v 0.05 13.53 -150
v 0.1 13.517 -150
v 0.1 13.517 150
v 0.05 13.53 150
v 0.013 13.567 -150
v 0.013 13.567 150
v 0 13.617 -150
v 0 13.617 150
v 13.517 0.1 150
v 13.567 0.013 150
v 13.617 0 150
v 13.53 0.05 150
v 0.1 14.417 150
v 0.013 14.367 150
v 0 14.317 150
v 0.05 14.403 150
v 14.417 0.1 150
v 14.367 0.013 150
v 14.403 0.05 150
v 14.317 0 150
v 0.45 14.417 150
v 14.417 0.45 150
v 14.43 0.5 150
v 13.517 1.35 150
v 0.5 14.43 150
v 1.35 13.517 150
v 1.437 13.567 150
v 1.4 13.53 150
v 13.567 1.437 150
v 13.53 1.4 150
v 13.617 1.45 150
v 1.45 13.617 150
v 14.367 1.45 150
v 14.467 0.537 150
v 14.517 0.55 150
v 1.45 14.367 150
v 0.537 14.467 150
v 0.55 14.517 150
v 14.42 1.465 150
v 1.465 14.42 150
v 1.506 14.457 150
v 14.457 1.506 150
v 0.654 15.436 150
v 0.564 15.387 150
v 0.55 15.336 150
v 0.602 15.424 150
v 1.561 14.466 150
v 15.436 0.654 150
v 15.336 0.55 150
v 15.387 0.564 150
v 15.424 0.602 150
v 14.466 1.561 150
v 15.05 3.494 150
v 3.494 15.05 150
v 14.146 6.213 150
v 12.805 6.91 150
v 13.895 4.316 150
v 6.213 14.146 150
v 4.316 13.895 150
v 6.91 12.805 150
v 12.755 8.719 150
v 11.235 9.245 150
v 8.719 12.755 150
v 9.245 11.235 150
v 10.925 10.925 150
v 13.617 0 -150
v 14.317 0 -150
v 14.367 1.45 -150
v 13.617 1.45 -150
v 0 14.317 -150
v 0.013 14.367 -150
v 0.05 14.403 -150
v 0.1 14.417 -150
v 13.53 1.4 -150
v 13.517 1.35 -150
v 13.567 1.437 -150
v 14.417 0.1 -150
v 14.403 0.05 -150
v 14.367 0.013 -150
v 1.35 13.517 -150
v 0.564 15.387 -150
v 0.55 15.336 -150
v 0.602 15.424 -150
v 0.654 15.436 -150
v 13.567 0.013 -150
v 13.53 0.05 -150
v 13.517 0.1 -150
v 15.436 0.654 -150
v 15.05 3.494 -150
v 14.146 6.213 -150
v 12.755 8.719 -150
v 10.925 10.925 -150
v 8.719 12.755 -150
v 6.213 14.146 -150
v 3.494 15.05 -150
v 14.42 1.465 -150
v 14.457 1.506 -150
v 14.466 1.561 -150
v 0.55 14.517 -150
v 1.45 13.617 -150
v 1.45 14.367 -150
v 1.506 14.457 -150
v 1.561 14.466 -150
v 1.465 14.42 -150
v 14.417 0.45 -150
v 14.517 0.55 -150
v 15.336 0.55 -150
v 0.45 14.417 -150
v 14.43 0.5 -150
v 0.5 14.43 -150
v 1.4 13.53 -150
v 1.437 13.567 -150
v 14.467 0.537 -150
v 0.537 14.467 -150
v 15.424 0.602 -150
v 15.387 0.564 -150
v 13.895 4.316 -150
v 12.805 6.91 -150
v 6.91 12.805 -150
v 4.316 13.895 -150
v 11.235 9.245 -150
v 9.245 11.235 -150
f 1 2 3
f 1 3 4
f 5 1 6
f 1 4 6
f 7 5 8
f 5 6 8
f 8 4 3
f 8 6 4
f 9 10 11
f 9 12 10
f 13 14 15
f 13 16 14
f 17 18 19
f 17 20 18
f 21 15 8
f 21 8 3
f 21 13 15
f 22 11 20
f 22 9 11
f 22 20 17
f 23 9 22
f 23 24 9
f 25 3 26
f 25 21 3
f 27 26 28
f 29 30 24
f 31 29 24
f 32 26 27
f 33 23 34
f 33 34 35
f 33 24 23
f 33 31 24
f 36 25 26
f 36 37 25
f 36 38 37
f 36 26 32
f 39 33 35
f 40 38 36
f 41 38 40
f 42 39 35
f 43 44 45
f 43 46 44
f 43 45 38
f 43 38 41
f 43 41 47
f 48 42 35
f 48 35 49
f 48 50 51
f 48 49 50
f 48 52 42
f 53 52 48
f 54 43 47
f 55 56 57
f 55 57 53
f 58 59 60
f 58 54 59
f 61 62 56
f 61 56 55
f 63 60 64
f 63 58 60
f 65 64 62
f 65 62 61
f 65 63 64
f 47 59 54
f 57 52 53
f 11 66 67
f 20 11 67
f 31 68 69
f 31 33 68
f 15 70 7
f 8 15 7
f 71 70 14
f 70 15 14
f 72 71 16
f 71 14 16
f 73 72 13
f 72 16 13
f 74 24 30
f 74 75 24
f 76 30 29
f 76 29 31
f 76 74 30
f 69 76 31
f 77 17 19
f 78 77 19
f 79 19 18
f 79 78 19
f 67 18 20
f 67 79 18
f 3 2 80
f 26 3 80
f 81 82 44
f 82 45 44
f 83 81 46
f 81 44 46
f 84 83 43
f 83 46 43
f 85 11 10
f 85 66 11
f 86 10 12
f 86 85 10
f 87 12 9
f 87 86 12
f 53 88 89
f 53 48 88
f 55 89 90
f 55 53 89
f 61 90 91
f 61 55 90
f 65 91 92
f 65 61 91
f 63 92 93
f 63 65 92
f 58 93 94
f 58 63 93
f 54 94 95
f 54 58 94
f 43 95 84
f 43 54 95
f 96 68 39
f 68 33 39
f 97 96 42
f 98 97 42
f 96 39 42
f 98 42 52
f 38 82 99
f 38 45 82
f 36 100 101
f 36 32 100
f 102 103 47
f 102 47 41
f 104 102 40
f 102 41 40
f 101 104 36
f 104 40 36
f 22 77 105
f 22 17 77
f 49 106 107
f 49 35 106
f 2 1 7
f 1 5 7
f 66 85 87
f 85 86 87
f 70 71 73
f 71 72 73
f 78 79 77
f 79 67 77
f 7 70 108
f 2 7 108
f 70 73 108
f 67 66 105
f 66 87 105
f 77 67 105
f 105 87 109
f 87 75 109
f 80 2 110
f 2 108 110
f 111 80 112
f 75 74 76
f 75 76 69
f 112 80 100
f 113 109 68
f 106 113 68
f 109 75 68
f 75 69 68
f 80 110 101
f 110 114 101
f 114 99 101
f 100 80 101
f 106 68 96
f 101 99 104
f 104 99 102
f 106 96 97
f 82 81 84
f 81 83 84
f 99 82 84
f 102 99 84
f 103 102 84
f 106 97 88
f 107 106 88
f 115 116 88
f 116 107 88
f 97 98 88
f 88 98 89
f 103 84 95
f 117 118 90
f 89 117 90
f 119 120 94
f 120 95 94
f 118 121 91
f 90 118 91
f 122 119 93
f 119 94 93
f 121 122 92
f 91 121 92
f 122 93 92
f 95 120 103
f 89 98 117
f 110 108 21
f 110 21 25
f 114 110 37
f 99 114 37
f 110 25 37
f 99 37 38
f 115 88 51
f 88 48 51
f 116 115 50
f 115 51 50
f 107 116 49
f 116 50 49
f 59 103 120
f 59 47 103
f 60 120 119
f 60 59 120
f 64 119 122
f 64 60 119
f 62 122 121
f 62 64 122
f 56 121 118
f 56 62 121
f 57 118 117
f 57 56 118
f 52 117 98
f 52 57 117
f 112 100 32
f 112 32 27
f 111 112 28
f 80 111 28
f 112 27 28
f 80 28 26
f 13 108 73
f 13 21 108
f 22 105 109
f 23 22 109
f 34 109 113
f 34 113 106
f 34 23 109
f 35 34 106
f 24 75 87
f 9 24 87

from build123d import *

# Parameters (mm, degrees)
EXTRUDE_THIN1_DEPTH = 150
FILLET1_R           = 0.1


with BuildPart() as part:
    # Sketch1 → Extrude-Thin1 (new, symmetric)
    with BuildSketch(Plane.XY):
        with BuildLine():
            Line((14.416629547, 0), (14.416629547, 0.55))
            Line((14.416629547, 0.55), (15.440207252, 0.55))
            ThreePointArc((15.440207252, 0.55), (10.924799769, 10.924799769), (0.55, 15.440207252))
            Line((0.55, 15.440207252), (0.55, 14.416629547))
            Line((0.55, 14.416629547), (0, 14.416629547))
            Line((0, 14.416629547), (0, 13.516629547))
            Line((0, 13.516629547), (1.45, 13.516629547))
            Line((1.45, 13.516629547), (1.45, 14.477568857))
            ThreePointArc((1.45, 14.477568857), (10.288403666, 10.288403666), (14.477568857, 1.45))
            Line((14.477568857, 1.45), (13.516629547, 1.45))
            Line((13.516629547, 1.45), (13.516629547, 0))
            Line((13.516629547, 0), (14.416629547, 0))
        make_face()
    extrude(amount=EXTRUDE_THIN1_DEPTH, both=True)

    # Fillet1
    fillet1_edges = [part.edges().sort_by_distance(p)[0] for p in [
        (13.516629547, 1.45, 0),
        (14.477568857, 1.45, 0),
        (1.45, 14.477568857, 0),
        (1.45, 13.516629547, 0),
        (0, 13.516629547, 0),
        (0, 14.416629547, 0),
        (0.55, 14.416629547, 0),
        (0.55, 15.440207252, 0),
        (15.440207252, 0.55, 0),
        (14.416629547, 0.55, 0),
        (14.416629547, 0, 0),
        (13.516629547, 0, 0),
    ]]
    fillet(fillet1_edges, radius=FILLET1_R)


solid = part.part
